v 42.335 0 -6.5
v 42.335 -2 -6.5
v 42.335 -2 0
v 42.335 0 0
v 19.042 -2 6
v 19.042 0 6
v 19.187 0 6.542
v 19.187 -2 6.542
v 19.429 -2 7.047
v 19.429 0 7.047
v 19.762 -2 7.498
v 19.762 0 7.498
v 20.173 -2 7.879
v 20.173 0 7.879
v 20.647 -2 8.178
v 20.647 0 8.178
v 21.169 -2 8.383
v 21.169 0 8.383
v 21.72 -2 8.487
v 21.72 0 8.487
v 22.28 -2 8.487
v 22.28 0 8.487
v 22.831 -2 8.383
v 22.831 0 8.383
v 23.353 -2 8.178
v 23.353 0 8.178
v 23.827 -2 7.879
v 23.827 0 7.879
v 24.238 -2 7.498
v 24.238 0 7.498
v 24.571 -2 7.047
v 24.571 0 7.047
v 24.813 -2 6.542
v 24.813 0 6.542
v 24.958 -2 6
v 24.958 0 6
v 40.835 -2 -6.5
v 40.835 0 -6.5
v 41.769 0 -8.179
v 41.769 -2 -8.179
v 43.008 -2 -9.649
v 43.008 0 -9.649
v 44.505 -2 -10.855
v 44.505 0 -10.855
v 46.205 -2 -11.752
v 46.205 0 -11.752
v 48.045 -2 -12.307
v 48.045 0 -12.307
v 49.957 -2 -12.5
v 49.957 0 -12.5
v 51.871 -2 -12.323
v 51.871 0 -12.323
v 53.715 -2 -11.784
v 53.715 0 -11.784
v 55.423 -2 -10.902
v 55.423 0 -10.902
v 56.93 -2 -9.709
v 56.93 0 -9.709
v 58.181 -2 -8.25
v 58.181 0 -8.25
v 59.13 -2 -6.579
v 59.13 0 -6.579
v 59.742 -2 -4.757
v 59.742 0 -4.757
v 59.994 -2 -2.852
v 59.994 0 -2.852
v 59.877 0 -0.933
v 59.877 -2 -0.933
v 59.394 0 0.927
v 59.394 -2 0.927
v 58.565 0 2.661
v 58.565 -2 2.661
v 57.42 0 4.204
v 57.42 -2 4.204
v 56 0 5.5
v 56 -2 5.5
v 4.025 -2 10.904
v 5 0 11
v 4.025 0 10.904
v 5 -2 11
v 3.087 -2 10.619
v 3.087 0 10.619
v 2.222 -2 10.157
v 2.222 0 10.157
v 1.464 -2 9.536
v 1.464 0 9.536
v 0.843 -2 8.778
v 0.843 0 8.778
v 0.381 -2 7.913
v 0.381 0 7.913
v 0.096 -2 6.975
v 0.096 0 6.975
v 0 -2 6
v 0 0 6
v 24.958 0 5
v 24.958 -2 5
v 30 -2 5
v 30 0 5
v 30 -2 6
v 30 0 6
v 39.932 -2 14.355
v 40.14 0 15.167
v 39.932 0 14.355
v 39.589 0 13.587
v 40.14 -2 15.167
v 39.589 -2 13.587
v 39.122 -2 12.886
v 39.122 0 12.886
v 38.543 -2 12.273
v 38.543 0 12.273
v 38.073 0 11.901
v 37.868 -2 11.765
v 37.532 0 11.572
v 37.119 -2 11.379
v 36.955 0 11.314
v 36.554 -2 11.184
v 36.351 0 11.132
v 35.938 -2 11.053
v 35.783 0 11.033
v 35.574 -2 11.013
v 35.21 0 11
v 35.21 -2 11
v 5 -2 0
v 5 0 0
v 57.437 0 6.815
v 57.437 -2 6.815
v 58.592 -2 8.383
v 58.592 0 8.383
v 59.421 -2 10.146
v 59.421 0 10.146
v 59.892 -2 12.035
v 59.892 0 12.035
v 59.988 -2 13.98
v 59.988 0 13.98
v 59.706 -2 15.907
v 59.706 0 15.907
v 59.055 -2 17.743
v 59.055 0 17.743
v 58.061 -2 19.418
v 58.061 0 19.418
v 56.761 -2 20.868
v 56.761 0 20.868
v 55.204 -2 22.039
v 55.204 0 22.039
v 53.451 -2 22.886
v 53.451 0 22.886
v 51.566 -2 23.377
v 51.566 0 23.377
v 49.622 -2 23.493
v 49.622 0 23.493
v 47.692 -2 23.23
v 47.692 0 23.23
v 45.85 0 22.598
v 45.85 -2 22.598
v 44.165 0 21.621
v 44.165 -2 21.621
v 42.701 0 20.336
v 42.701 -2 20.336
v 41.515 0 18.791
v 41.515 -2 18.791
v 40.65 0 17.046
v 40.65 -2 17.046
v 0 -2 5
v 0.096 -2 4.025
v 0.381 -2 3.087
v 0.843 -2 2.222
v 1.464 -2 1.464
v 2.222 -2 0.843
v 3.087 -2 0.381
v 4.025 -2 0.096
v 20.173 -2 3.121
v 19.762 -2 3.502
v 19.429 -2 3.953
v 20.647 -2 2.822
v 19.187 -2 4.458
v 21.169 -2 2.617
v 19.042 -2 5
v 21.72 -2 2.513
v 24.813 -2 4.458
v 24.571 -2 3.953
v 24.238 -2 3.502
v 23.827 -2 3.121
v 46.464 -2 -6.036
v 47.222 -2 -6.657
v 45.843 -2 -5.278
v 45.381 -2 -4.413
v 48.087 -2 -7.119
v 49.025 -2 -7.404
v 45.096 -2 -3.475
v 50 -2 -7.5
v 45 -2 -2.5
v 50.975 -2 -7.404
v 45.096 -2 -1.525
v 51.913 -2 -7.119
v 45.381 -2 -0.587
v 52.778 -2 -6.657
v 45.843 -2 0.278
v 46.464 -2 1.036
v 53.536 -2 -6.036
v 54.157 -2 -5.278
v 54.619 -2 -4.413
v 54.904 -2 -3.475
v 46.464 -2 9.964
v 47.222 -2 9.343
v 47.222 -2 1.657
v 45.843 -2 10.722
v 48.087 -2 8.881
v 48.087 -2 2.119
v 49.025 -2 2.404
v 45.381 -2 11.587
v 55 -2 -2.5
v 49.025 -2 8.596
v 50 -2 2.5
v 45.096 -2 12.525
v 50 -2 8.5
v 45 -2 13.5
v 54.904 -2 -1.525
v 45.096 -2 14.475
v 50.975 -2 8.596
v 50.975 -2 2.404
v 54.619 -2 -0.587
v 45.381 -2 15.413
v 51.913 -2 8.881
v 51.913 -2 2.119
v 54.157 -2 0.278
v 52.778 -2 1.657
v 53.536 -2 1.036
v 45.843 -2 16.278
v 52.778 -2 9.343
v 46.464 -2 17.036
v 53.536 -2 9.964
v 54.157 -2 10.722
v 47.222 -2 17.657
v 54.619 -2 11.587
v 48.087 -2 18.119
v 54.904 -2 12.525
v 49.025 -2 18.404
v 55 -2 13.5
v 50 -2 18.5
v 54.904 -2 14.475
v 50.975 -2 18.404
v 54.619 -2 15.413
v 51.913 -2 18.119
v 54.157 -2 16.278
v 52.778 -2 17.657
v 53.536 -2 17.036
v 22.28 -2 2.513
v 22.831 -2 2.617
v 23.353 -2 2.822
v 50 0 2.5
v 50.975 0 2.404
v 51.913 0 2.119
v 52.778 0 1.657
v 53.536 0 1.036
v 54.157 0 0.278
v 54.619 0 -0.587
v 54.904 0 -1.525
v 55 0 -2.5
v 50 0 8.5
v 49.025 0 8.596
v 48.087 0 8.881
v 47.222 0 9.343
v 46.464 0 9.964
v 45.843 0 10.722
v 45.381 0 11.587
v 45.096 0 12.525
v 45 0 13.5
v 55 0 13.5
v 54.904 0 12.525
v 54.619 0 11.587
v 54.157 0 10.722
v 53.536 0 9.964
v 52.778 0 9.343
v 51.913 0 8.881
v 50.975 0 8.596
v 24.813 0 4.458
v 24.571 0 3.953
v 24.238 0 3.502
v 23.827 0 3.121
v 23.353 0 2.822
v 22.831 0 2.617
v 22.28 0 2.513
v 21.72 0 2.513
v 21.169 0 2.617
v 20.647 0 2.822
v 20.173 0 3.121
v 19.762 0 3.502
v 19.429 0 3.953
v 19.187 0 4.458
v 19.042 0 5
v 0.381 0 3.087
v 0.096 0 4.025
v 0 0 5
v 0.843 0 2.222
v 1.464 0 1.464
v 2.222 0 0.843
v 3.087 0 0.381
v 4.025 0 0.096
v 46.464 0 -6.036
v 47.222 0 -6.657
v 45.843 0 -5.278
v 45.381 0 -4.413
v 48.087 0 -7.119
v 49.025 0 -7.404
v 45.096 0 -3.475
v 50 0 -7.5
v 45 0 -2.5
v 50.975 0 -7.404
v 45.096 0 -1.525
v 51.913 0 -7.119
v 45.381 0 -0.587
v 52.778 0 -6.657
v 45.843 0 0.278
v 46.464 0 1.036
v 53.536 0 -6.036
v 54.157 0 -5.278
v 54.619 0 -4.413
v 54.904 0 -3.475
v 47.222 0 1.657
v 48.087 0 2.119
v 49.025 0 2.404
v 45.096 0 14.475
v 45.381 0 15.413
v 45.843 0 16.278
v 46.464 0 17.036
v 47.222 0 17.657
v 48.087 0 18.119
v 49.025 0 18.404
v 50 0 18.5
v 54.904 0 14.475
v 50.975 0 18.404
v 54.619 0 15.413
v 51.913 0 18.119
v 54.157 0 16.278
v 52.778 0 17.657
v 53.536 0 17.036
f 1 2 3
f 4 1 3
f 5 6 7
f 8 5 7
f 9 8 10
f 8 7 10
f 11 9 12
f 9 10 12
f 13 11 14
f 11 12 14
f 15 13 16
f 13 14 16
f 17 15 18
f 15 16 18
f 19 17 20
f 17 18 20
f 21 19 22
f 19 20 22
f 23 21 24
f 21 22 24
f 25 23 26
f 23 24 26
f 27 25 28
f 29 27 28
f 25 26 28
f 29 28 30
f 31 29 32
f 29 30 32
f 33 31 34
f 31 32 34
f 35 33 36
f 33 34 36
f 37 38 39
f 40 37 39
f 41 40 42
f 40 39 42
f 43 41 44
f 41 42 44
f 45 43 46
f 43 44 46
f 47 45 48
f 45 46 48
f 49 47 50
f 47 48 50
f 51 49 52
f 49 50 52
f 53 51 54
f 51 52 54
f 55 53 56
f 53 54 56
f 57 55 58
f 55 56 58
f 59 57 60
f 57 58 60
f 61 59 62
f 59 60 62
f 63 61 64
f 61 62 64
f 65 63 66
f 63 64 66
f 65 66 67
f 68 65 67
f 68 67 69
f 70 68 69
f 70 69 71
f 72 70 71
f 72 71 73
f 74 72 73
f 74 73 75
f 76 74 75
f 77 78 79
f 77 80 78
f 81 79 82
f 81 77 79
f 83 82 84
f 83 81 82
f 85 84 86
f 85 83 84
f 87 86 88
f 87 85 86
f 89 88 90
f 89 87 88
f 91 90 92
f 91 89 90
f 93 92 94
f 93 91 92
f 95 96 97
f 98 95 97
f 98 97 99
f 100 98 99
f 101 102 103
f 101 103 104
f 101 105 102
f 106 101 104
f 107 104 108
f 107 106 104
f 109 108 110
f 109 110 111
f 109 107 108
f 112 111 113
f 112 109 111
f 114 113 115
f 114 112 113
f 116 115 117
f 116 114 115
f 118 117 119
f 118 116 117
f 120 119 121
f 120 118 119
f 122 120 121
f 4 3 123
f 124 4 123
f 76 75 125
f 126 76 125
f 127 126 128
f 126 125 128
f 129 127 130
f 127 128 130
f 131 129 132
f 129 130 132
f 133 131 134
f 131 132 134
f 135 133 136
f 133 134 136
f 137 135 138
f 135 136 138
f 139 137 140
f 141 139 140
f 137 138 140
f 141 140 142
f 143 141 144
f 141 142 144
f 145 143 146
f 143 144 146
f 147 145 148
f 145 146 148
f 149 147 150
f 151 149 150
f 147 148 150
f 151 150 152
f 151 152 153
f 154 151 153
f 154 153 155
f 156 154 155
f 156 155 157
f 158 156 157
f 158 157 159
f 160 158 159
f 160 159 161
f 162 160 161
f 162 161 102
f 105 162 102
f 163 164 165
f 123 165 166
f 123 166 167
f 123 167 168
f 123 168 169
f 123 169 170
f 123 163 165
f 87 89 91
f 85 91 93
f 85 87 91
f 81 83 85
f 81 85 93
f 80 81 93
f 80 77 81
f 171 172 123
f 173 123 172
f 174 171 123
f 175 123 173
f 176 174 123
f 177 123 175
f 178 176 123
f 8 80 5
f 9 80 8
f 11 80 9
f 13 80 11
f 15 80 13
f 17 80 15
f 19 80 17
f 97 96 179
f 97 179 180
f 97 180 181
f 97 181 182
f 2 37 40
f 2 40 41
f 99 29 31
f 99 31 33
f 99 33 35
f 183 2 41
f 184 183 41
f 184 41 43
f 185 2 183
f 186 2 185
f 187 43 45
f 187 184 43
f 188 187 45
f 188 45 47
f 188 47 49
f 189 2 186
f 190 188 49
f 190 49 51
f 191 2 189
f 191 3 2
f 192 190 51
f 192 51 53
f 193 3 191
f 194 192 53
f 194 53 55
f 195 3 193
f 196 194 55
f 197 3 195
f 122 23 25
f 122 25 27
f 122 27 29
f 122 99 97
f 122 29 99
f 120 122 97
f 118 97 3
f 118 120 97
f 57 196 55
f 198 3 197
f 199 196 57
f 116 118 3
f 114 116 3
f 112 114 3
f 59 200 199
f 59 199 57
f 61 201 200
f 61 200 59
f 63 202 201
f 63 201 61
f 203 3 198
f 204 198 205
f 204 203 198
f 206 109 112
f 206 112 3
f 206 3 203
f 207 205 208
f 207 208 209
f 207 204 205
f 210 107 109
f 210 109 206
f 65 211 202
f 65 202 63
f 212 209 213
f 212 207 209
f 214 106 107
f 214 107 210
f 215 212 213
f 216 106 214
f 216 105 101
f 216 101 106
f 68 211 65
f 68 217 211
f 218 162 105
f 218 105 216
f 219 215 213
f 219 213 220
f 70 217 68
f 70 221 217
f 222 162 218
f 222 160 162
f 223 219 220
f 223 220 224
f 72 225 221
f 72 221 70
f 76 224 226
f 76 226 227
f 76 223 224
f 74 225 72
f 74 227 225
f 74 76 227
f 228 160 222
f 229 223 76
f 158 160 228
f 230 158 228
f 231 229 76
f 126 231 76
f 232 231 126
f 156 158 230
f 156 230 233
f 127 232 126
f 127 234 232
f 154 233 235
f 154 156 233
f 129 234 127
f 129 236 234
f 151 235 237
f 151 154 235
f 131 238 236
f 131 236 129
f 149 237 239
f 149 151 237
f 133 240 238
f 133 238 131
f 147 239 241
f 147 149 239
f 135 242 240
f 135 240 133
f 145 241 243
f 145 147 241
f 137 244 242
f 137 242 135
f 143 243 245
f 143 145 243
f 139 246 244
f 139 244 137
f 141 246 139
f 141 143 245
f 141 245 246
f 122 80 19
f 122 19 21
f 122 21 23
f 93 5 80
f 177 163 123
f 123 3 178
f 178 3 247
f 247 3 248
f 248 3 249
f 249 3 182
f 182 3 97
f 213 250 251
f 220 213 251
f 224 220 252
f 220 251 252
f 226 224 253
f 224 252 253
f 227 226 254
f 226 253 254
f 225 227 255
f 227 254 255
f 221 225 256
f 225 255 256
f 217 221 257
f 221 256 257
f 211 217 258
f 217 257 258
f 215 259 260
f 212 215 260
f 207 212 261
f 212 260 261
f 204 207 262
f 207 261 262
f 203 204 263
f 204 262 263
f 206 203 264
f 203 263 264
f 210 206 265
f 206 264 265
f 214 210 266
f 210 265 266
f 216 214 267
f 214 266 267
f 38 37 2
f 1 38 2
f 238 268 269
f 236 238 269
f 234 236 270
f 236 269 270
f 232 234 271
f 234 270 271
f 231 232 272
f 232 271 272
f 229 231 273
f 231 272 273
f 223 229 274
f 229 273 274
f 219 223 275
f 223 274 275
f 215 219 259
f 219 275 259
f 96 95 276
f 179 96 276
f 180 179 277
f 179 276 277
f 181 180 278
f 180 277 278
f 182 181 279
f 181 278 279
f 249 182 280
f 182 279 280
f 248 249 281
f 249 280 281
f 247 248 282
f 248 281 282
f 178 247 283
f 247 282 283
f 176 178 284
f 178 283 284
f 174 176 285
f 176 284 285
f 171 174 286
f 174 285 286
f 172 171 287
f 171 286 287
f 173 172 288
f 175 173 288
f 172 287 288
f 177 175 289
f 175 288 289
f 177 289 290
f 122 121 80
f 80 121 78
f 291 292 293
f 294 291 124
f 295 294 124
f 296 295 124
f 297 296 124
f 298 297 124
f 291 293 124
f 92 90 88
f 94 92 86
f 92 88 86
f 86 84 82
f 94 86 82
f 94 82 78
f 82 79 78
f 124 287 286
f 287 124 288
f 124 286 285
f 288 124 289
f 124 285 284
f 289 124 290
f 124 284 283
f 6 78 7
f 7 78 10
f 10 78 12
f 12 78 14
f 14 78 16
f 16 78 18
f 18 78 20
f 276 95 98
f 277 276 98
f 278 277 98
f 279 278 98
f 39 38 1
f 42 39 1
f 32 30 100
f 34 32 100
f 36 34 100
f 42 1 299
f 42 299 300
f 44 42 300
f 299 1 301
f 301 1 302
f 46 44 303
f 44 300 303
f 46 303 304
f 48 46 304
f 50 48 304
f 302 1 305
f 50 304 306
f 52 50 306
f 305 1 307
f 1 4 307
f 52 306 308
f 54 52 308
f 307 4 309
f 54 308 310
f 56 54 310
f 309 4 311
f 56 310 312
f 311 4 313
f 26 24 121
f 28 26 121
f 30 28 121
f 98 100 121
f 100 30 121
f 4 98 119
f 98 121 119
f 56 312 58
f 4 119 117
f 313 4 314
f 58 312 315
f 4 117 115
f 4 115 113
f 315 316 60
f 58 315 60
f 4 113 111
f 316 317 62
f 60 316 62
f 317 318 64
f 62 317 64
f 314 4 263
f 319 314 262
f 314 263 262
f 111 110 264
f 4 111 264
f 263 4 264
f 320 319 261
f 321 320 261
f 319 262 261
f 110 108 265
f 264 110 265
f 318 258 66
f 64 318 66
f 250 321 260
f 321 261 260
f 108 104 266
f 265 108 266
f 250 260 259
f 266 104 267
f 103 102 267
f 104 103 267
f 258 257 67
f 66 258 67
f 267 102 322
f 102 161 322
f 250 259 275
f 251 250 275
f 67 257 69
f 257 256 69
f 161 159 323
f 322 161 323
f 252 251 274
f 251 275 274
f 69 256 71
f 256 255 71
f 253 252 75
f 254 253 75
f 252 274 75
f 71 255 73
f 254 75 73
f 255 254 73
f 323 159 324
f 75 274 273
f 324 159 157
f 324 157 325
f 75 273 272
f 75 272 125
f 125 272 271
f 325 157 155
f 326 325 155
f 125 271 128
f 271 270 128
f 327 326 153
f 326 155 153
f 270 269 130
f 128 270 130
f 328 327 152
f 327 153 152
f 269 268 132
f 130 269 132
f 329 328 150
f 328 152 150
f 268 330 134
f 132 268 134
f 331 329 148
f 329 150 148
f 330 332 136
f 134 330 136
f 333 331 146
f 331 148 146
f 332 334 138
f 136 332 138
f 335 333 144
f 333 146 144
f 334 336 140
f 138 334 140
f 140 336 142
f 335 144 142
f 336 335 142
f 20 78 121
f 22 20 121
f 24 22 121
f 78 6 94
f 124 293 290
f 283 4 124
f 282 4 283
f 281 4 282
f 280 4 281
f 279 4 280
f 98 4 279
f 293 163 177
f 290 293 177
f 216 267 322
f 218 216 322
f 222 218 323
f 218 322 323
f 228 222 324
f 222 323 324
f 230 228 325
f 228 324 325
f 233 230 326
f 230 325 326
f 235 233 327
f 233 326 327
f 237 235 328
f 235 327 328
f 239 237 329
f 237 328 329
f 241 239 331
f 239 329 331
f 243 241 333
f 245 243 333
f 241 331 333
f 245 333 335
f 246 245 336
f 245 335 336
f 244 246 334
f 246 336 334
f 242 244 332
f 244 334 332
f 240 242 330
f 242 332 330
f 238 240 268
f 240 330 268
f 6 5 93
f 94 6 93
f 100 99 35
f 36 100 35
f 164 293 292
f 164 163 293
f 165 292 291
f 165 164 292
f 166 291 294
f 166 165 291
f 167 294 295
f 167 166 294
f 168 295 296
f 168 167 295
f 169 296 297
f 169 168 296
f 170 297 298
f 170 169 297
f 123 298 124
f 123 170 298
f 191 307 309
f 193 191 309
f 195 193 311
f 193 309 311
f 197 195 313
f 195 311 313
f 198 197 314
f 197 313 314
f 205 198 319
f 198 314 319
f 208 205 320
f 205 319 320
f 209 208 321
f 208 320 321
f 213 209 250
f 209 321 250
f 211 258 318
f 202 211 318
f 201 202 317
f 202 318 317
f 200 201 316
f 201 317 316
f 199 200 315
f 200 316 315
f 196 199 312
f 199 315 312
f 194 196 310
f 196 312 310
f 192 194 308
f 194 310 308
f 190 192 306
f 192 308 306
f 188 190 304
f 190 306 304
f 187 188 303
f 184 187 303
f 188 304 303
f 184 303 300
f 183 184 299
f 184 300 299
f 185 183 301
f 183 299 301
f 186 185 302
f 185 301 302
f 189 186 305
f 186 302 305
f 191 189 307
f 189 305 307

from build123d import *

# Parameters (mm, degrees)
F1_DEPTH = 2
F2_R     = 5
F4_DEPTH = 2
F6_DEPTH = 25


# Not quite as in the source:
# - a feature names something its author has since deleted; it is built from what else it names


with BuildPart() as f1:
    # F0 (on Front) → F1 (new body)
    with BuildSketch(Plane.XZ):
        with BuildLine():
            Line((0, 5.5), (0, 0))
            Line((0, 0), (40, 0))
            Line((40, 0), (40, 5.5))
            Line((40, 5.5), (25, 5.5))
            ThreePointArc((25, 5.5), (22, 2.5), (19, 5.5))
            Line((19, 5.5), (0, 5.5))
        make_face()
        with BuildLine():
            Line((40, 5.5), (40, 0))
            Line((40, 0), (40, -2.5))
            ThreePointArc((40, -2.5), (41.05572809, 1.972135955), (44, 5.5))
            Line((44, 5.5), (40, 5.5))
        make_face()
        with BuildLine():
            Line((0, 11), (0, 5.5))
            Line((0, 5.5), (19, 5.5))
            ThreePointArc((19, 5.5), (22, 8.5), (25, 5.5))
            Line((25, 5.5), (40, 5.5))
            Line((40, 5.5), (40, 11))
            Line((40, 11), (0, 11))
        make_face()
        with BuildLine():
            Line((40, 11), (40, 5.5))
            Line((40, 5.5), (44, 5.5))
            ThreePointArc((44, 5.5), (41.05572809, 9.027864045), (40, 13.5))
            Line((40, 13.5), (40, 11))
        make_face()
        with BuildLine():
            Line((45, -2.5), (40, -2.5))
            ThreePointArc((40, -2.5), (50, -12.5), (60, -2.5))
            ThreePointArc((60, -2.5), (58.94427191, 1.972135955), (56, 5.5))
            ThreePointArc((56, 5.5), (53.1622776602, 4.0131670195), (50, 3.5))
            Line((50, 3.5), (50, 2.5))
            ThreePointArc((50, 2.5), (53.5355339059, 1.0355339059), (55, -2.5))
            ThreePointArc((55, -2.5), (50, -7.5), (45, -2.5))
        make_face()
        with BuildLine():
            ThreePointArc((44, 5.5), (41.05572809, 1.972135955), (40, -2.5))
            Line((40, -2.5), (45, -2.5))
            ThreePointArc((45, -2.5), (46.4644660941, 1.0355339059), (50, 2.5))
            Line((50, 2.5), (50, 3.5))
            ThreePointArc((50, 3.5), (46.8377223398, 4.0131670195), (44, 5.5))
        make_face()
        with BuildLine():
            ThreePointArc((40, 13.5), (41.05572809, 9.027864045), (44, 5.5))
            ThreePointArc((44, 5.5), (46.8377223398, 6.9868329805), (50, 7.5))
            Line((50, 7.5), (50, 8.5))
            ThreePointArc((50, 8.5), (46.4644660941, 9.9644660941), (45, 13.5))
            Line((45, 13.5), (40, 13.5))
        make_face()
        with BuildLine():
            Line((50, 5.5), (44, 5.5))
            ThreePointArc((44, 5.5), (46.8377223398, 4.0131670195), (50, 3.5))
            Line((50, 3.5), (50, 5.5))
        make_face()
        with BuildLine():
            ThreePointArc((50, 7.5), (46.8377223398, 6.9868329805), (44, 5.5))
            Line((44, 5.5), (50, 5.5))
            Line((50, 5.5), (50, 7.5))
        make_face()
        with BuildLine():
            ThreePointArc((60, 13.5), (50, 23.5), (40, 13.5))
            Line((40, 13.5), (45, 13.5))
            ThreePointArc((45, 13.5), (50, 18.5), (55, 13.5))
            ThreePointArc((55, 13.5), (53.5355339059, 9.9644660941), (50, 8.5))
            Line((50, 8.5), (50, 7.5))
            ThreePointArc((50, 7.5), (53.1622776602, 6.9868329805), (56, 5.5))
            ThreePointArc((56, 5.5), (58.94427191, 9.027864045), (60, 13.5))
        make_face()
        with BuildLine():
            ThreePointArc((56, 5.5), (53.1622776602, 6.9868329805), (50, 7.5))
            Line((50, 7.5), (50, 5.5))
            Line((50, 5.5), (56, 5.5))
        make_face()
        with BuildLine():
            Line((50, 5.5), (50, 3.5))
            ThreePointArc((50, 3.5), (53.1622776602, 4.0131670195), (56, 5.5))
            Line((56, 5.5), (50, 5.5))
        make_face()
    extrude(amount=F1_DEPTH)

    # F2
    f2_edges = [f1.edges().sort_by_distance(p)[0] for p in [
        (40, -1, 11),
        (0, -1, 11),
        (0, -1, 0),
    ]]
    fillet(f2_edges, radius=F2_R)

    # F3 (on face) → F4 (cut, through all)
    with BuildSketch(Plane.XZ.offset(2)):
        with BuildLine():
            Line((19.0419601085, 6), (0, 6))
            Line((0, 6), (0, 5))
            Line((0, 5), (19.0419601085, 5))
            ThreePointArc((19.0419601085, 5), (19, 5.5), (19.0419601085, 6))
        make_face()
        with BuildLine():
            Line((30, 6), (24.9580398915, 6))
            ThreePointArc((24.9580398915, 6), (24.9894915684, 5.7508787808), (25, 5.5))
            ThreePointArc((25, 5.5), (24.9894915684, 5.2491212192), (24.9580398915, 5))
            Line((24.9580398915, 5), (30, 5))
            Line((30, 5), (30, 6))
        make_face()
    extrude(amount=-F4_DEPTH, mode=Mode.SUBTRACT)

    # F5 (on face) → F6 (cut)
    with BuildSketch(Plane.XZ.offset(2)):
        with BuildLine():
            ThreePointArc((40, -2.5), (40.2109368707, -4.5430964369), (40.8348486101, -6.5))
            Line((40.8348486101, -6.5), (42.3348486101, -6.5))
            Line((42.3348486101, -6.5), (42.3348486101, 0))
            Line((42.3348486101, 0), (40.3175416345, 0))
            ThreePointArc((40.3175416345, 0), (40.0797030373, -1.2399570752), (40, -2.5))
        make_face()
        with BuildLine():
            ThreePointArc((40, -2.5), (40.0797030373, -1.2399570752), (40.3175416345, 0))
            Line((40.3175416345, 0), (40, 0))
            Line((40, 0), (40, -2.5))
        make_face()
    extrude(amount=-F6_DEPTH, mode=Mode.SUBTRACT)


solid = f1.part
